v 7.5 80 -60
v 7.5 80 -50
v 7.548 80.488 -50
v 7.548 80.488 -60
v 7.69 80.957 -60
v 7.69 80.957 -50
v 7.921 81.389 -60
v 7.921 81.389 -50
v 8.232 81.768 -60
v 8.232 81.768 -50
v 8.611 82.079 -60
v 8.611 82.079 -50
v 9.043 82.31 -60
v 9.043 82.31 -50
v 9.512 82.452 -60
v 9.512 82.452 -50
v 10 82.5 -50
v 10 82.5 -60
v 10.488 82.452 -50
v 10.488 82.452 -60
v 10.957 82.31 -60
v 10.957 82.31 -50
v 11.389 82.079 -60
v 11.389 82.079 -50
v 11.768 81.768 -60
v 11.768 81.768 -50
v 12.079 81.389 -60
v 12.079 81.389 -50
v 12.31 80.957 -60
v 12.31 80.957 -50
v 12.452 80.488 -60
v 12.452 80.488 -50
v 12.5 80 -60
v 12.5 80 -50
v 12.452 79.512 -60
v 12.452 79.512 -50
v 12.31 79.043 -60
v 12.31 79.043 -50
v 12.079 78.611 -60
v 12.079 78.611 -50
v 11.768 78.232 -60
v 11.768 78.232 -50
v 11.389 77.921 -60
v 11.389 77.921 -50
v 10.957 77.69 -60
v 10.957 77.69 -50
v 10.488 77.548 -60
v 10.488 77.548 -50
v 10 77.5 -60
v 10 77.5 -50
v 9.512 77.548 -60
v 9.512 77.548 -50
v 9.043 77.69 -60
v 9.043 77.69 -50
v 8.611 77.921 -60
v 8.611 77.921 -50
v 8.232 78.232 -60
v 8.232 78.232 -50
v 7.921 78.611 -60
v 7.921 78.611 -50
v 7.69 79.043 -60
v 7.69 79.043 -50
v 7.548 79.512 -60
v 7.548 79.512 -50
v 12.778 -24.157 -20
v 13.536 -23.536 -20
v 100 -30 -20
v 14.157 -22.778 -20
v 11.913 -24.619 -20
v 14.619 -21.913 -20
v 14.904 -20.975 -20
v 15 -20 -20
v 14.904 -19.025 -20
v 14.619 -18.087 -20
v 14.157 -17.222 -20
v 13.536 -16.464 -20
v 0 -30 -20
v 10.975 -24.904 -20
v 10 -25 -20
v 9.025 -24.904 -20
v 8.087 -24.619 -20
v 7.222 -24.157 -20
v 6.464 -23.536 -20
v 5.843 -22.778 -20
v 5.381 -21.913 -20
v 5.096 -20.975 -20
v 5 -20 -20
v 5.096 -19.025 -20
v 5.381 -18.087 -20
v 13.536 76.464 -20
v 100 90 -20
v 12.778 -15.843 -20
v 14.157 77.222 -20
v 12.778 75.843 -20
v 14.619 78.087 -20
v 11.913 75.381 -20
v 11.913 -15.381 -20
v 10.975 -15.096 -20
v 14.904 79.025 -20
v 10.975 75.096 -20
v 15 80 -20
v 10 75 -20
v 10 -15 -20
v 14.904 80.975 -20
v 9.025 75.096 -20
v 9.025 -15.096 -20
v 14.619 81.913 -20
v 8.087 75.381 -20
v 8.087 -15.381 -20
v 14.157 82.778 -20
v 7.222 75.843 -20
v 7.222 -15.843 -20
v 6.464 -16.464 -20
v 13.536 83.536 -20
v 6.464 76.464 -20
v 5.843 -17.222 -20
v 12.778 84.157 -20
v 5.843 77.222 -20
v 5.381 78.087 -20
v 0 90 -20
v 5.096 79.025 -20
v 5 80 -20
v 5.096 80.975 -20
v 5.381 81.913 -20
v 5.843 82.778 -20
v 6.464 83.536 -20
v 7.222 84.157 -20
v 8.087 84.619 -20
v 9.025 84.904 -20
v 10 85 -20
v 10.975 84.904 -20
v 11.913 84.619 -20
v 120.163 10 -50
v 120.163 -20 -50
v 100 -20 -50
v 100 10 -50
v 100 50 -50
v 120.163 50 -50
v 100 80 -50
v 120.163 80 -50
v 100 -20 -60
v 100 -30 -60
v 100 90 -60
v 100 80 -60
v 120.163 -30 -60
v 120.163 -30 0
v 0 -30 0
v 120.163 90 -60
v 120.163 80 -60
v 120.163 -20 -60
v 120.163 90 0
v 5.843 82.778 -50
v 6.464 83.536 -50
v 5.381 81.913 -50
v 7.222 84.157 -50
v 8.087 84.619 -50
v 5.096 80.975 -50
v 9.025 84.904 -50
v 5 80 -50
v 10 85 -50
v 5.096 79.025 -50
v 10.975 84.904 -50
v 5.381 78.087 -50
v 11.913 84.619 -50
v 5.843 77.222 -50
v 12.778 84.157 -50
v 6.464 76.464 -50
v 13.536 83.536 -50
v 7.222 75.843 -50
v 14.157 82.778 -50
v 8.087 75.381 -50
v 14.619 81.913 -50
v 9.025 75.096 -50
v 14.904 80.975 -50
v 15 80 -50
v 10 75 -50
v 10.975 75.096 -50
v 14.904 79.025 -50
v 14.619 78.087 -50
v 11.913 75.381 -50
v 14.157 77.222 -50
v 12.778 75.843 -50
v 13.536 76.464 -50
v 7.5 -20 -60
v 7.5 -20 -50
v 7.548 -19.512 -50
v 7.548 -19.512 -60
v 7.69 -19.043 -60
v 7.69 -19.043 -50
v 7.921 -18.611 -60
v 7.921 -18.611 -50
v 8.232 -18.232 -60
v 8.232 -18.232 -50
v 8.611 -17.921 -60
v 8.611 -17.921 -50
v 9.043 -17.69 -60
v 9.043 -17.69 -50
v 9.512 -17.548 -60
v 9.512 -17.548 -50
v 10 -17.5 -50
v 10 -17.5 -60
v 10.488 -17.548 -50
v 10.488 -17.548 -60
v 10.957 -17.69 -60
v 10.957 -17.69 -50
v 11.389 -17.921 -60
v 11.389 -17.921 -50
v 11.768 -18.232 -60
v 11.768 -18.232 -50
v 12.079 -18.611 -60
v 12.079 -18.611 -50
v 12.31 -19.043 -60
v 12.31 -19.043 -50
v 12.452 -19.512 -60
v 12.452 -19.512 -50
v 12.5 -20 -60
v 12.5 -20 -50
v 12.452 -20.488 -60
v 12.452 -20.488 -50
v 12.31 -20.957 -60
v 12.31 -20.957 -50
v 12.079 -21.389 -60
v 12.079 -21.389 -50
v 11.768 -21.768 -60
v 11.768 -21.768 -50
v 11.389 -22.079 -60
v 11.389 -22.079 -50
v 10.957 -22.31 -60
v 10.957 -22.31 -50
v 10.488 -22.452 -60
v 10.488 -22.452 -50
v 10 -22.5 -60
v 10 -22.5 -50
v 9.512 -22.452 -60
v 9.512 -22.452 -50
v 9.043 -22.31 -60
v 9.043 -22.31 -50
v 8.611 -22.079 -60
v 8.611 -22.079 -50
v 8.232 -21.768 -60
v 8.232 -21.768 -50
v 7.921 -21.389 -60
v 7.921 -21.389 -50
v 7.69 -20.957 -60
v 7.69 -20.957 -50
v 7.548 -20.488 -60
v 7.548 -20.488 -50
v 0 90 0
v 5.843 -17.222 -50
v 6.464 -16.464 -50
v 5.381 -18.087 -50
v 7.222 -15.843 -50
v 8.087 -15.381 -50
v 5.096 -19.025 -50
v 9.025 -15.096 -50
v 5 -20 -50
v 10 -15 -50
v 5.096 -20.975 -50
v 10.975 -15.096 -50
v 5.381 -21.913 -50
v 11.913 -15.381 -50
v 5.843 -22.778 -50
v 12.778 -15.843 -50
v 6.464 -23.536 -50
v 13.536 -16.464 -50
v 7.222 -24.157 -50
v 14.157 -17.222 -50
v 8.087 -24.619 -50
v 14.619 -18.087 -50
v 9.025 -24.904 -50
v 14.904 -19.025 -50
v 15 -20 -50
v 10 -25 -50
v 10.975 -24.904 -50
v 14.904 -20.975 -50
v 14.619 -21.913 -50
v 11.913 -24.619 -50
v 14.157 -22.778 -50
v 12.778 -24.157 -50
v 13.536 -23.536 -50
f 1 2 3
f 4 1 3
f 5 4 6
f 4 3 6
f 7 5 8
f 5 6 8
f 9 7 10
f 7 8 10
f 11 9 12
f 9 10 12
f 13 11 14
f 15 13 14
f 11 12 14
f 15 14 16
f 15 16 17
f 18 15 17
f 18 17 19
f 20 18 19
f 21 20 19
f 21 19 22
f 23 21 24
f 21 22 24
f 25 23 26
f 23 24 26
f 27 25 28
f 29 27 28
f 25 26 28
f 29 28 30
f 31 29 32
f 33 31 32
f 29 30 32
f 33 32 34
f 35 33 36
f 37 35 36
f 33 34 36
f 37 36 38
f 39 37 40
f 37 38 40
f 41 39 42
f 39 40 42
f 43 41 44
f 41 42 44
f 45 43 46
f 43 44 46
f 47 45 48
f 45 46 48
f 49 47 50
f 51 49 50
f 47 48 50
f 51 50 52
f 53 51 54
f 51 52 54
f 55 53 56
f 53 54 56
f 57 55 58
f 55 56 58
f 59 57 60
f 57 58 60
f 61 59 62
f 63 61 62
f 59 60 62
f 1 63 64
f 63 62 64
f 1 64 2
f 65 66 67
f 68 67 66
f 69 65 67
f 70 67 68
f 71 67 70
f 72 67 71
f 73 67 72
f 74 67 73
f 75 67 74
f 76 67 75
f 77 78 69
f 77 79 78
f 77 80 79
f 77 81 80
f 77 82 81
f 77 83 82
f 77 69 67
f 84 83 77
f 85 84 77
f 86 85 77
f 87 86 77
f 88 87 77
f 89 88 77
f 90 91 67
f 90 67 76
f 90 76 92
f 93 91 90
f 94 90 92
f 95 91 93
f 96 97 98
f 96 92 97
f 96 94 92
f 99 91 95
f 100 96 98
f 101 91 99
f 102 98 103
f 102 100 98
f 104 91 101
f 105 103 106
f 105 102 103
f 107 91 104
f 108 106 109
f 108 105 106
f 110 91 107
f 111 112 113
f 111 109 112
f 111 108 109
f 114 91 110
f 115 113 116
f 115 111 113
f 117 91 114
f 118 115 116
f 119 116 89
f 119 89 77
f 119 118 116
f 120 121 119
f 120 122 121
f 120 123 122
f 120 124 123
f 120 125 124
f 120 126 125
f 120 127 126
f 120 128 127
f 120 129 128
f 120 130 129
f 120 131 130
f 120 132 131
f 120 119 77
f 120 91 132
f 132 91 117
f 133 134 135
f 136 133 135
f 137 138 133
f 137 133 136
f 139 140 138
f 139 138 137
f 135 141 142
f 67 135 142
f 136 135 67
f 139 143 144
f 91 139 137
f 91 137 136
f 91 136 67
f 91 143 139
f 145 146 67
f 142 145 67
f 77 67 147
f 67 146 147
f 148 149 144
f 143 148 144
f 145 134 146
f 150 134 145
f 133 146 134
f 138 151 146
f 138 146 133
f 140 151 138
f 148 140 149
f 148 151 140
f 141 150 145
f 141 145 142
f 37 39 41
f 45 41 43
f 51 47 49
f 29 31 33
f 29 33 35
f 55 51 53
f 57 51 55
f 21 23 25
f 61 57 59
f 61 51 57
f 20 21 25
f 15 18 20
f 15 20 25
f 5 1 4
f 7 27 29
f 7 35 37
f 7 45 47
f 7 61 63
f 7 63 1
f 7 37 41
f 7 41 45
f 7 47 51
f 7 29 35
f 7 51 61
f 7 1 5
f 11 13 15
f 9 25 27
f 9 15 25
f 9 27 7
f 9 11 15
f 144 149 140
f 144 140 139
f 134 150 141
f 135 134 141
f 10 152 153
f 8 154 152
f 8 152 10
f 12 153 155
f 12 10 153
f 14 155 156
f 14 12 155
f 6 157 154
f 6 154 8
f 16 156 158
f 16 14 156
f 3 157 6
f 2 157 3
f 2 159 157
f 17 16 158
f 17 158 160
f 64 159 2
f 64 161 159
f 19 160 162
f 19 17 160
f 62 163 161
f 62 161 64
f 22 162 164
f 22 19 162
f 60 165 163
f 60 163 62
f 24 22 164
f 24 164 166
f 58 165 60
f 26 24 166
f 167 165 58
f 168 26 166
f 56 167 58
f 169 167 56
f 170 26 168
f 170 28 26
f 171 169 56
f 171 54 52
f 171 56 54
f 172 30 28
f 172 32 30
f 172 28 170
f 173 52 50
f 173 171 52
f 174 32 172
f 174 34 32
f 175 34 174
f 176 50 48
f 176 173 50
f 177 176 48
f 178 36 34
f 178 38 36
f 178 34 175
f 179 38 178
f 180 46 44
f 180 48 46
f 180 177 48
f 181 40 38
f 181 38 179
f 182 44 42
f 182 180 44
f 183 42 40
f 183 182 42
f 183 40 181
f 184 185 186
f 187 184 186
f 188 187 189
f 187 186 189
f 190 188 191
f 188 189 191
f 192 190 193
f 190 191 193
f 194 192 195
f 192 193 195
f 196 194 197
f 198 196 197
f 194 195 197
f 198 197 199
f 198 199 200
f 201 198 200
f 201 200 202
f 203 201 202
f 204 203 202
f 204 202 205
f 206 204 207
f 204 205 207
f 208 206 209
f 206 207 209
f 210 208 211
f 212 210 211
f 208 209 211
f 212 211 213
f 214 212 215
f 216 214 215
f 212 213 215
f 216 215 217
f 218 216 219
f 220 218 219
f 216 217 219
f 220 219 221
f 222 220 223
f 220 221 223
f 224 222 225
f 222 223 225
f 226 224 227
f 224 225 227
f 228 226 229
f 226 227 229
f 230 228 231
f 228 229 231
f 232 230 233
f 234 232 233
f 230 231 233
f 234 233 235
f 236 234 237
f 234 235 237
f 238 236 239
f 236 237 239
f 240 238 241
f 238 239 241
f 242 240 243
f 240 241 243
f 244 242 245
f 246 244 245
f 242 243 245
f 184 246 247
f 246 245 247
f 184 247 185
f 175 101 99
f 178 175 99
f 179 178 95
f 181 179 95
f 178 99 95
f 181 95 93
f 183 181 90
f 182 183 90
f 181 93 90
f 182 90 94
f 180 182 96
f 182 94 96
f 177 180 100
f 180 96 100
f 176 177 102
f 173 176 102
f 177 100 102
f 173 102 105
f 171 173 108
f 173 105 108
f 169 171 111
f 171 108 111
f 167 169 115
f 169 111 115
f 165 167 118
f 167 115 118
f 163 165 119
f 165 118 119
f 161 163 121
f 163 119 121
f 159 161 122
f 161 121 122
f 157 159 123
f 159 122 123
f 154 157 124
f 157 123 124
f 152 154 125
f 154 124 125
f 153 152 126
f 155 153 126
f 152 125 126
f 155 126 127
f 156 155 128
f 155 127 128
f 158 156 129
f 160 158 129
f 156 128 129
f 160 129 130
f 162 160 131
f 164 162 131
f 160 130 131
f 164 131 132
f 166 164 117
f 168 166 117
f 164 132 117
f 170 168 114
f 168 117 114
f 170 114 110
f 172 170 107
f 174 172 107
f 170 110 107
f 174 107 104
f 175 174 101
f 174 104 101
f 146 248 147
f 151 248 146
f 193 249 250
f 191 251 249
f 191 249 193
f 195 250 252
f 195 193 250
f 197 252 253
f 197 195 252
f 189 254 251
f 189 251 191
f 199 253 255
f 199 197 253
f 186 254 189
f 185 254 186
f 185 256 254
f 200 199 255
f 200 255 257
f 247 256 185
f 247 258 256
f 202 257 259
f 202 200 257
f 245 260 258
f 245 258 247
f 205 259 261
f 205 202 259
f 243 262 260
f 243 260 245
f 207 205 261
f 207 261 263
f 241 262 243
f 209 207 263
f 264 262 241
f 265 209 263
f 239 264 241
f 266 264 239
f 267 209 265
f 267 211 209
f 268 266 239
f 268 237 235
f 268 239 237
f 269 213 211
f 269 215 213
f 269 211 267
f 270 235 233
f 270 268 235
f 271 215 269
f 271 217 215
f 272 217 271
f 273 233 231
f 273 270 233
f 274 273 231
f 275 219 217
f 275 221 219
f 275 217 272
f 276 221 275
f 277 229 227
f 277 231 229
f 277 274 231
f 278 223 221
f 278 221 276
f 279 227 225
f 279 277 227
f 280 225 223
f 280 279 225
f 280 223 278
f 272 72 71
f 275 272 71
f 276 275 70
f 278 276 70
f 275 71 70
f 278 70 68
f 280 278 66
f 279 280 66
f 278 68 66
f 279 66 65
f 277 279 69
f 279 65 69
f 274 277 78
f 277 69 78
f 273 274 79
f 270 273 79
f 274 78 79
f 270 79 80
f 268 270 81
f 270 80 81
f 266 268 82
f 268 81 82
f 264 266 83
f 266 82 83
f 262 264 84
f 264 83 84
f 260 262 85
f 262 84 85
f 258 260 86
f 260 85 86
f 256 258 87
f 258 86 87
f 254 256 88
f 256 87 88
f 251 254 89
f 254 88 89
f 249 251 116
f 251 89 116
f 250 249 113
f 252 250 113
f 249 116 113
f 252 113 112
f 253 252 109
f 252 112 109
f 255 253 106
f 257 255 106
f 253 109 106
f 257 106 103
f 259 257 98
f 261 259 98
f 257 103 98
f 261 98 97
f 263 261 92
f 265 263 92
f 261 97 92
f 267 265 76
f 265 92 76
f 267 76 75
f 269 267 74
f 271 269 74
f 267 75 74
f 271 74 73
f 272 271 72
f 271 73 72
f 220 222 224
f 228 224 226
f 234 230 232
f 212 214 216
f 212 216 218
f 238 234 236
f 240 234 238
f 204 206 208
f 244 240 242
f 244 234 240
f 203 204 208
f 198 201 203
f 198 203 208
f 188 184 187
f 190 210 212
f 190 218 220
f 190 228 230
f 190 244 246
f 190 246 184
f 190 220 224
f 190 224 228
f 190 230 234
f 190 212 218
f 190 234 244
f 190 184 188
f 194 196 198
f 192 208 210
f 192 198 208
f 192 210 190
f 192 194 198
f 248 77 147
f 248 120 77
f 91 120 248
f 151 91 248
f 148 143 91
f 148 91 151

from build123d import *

# Parameters (mm, degrees)
EXTRUDE_1_DEPTH     = 60
SKETCH_3_W          = 10
SKETCH_3_H          = 40
CUT_EXTRUDE_2_DEPTH = 148.102218349
EXTRUDE_4_DEPTH     = 30
EXTRUDE_5_DEPTH     = 30
SKETCH_9_R          = 5
EXTRUDE_6_DEPTH     = 30
SKETCH_10_R         = 2.5
EXTRUDE_7_DEPTH     = 10
SKETCH_11_W         = 20.162650783
SKETCH_11_H         = 30
CUT_EXTRUDE_3_DEPTH = 10


with BuildPart() as part:
    # 草图1 → 凸台-拉伸1 (new body)
    with BuildSketch(Plane(origin=(0, 0, 0), x_dir=(1, 0, 0), z_dir=(0, 1, 0))):
        Polygon((0, 0), (120.162650783, 0), (120.162650783, 60), (100, 60), (100, 20), (0, 20), align=None)
    extrude(amount=EXTRUDE_1_DEPTH)

    # 草图3 → 切除-拉伸2 (cut, through all)
    with BuildSketch(Plane(origin=(120.162650783, 0, 0), x_dir=(0, 0, -1), z_dir=(1, 0, 0))):
        with Locations((55, 30)):
            Rectangle(SKETCH_3_W, SKETCH_3_H)
    extrude(amount=-CUT_EXTRUDE_2_DEPTH, mode=Mode.SUBTRACT)

    # 草图7 → 凸台-拉伸4 (add)
    with BuildSketch(Plane(origin=(0, 60, 0), x_dir=(1, 0, 0), z_dir=(0, 1, 0))):
        Polygon((0, 20), (0, 0), (120.162650783, 0), (120.162650783, 60), (100, 60), (100, 20), align=None)
    extrude(amount=EXTRUDE_4_DEPTH)

    # 草图8 → 凸台-拉伸5 (add)
    with BuildSketch(Plane.XZ):
        Polygon((0, -20), (0, 0), (120.162650783, 0), (120.162650783, -60), (100, -60), (100, -20), align=None)
    extrude(amount=EXTRUDE_5_DEPTH)

    # 草图9 → 凸台-拉伸6 (add)
    with BuildSketch(Plane(origin=(0, 0, -20), x_dir=(-1, 0, 0), z_dir=(0, 0, -1))):
        with Locations(Location((-10, -20, 0), (0, 0, 180))):
            Circle(SKETCH_9_R)
        with Locations(Location((-10, 80, 0), (0, 0, 180))):
            Circle(SKETCH_9_R)
    extrude(amount=EXTRUDE_6_DEPTH)

    # 草图10 → 凸台-拉伸7 (add)
    with BuildSketch(Plane(origin=(0, 0, -50), x_dir=(-1, 0, 0), z_dir=(0, 0, -1))):
        with Locations((-10, -20)):
            Circle(SKETCH_10_R)
        with Locations((-10, 80)):
            Circle(SKETCH_10_R)
    extrude(amount=EXTRUDE_7_DEPTH)

    # 草图11 → 切除-拉伸3 (cut)
    with BuildSketch(Plane(origin=(0, 0, -60), x_dir=(-1, 0, 0), z_dir=(0, 0, -1))):
        with Locations((-110.081325392, -5)):
            Rectangle(SKETCH_11_W, SKETCH_11_H)
        with Locations((-110.081325392, 65)):
            Rectangle(SKETCH_11_W, SKETCH_11_H)
    extrude(amount=-CUT_EXTRUDE_3_DEPTH, mode=Mode.SUBTRACT)


solid = part.part
